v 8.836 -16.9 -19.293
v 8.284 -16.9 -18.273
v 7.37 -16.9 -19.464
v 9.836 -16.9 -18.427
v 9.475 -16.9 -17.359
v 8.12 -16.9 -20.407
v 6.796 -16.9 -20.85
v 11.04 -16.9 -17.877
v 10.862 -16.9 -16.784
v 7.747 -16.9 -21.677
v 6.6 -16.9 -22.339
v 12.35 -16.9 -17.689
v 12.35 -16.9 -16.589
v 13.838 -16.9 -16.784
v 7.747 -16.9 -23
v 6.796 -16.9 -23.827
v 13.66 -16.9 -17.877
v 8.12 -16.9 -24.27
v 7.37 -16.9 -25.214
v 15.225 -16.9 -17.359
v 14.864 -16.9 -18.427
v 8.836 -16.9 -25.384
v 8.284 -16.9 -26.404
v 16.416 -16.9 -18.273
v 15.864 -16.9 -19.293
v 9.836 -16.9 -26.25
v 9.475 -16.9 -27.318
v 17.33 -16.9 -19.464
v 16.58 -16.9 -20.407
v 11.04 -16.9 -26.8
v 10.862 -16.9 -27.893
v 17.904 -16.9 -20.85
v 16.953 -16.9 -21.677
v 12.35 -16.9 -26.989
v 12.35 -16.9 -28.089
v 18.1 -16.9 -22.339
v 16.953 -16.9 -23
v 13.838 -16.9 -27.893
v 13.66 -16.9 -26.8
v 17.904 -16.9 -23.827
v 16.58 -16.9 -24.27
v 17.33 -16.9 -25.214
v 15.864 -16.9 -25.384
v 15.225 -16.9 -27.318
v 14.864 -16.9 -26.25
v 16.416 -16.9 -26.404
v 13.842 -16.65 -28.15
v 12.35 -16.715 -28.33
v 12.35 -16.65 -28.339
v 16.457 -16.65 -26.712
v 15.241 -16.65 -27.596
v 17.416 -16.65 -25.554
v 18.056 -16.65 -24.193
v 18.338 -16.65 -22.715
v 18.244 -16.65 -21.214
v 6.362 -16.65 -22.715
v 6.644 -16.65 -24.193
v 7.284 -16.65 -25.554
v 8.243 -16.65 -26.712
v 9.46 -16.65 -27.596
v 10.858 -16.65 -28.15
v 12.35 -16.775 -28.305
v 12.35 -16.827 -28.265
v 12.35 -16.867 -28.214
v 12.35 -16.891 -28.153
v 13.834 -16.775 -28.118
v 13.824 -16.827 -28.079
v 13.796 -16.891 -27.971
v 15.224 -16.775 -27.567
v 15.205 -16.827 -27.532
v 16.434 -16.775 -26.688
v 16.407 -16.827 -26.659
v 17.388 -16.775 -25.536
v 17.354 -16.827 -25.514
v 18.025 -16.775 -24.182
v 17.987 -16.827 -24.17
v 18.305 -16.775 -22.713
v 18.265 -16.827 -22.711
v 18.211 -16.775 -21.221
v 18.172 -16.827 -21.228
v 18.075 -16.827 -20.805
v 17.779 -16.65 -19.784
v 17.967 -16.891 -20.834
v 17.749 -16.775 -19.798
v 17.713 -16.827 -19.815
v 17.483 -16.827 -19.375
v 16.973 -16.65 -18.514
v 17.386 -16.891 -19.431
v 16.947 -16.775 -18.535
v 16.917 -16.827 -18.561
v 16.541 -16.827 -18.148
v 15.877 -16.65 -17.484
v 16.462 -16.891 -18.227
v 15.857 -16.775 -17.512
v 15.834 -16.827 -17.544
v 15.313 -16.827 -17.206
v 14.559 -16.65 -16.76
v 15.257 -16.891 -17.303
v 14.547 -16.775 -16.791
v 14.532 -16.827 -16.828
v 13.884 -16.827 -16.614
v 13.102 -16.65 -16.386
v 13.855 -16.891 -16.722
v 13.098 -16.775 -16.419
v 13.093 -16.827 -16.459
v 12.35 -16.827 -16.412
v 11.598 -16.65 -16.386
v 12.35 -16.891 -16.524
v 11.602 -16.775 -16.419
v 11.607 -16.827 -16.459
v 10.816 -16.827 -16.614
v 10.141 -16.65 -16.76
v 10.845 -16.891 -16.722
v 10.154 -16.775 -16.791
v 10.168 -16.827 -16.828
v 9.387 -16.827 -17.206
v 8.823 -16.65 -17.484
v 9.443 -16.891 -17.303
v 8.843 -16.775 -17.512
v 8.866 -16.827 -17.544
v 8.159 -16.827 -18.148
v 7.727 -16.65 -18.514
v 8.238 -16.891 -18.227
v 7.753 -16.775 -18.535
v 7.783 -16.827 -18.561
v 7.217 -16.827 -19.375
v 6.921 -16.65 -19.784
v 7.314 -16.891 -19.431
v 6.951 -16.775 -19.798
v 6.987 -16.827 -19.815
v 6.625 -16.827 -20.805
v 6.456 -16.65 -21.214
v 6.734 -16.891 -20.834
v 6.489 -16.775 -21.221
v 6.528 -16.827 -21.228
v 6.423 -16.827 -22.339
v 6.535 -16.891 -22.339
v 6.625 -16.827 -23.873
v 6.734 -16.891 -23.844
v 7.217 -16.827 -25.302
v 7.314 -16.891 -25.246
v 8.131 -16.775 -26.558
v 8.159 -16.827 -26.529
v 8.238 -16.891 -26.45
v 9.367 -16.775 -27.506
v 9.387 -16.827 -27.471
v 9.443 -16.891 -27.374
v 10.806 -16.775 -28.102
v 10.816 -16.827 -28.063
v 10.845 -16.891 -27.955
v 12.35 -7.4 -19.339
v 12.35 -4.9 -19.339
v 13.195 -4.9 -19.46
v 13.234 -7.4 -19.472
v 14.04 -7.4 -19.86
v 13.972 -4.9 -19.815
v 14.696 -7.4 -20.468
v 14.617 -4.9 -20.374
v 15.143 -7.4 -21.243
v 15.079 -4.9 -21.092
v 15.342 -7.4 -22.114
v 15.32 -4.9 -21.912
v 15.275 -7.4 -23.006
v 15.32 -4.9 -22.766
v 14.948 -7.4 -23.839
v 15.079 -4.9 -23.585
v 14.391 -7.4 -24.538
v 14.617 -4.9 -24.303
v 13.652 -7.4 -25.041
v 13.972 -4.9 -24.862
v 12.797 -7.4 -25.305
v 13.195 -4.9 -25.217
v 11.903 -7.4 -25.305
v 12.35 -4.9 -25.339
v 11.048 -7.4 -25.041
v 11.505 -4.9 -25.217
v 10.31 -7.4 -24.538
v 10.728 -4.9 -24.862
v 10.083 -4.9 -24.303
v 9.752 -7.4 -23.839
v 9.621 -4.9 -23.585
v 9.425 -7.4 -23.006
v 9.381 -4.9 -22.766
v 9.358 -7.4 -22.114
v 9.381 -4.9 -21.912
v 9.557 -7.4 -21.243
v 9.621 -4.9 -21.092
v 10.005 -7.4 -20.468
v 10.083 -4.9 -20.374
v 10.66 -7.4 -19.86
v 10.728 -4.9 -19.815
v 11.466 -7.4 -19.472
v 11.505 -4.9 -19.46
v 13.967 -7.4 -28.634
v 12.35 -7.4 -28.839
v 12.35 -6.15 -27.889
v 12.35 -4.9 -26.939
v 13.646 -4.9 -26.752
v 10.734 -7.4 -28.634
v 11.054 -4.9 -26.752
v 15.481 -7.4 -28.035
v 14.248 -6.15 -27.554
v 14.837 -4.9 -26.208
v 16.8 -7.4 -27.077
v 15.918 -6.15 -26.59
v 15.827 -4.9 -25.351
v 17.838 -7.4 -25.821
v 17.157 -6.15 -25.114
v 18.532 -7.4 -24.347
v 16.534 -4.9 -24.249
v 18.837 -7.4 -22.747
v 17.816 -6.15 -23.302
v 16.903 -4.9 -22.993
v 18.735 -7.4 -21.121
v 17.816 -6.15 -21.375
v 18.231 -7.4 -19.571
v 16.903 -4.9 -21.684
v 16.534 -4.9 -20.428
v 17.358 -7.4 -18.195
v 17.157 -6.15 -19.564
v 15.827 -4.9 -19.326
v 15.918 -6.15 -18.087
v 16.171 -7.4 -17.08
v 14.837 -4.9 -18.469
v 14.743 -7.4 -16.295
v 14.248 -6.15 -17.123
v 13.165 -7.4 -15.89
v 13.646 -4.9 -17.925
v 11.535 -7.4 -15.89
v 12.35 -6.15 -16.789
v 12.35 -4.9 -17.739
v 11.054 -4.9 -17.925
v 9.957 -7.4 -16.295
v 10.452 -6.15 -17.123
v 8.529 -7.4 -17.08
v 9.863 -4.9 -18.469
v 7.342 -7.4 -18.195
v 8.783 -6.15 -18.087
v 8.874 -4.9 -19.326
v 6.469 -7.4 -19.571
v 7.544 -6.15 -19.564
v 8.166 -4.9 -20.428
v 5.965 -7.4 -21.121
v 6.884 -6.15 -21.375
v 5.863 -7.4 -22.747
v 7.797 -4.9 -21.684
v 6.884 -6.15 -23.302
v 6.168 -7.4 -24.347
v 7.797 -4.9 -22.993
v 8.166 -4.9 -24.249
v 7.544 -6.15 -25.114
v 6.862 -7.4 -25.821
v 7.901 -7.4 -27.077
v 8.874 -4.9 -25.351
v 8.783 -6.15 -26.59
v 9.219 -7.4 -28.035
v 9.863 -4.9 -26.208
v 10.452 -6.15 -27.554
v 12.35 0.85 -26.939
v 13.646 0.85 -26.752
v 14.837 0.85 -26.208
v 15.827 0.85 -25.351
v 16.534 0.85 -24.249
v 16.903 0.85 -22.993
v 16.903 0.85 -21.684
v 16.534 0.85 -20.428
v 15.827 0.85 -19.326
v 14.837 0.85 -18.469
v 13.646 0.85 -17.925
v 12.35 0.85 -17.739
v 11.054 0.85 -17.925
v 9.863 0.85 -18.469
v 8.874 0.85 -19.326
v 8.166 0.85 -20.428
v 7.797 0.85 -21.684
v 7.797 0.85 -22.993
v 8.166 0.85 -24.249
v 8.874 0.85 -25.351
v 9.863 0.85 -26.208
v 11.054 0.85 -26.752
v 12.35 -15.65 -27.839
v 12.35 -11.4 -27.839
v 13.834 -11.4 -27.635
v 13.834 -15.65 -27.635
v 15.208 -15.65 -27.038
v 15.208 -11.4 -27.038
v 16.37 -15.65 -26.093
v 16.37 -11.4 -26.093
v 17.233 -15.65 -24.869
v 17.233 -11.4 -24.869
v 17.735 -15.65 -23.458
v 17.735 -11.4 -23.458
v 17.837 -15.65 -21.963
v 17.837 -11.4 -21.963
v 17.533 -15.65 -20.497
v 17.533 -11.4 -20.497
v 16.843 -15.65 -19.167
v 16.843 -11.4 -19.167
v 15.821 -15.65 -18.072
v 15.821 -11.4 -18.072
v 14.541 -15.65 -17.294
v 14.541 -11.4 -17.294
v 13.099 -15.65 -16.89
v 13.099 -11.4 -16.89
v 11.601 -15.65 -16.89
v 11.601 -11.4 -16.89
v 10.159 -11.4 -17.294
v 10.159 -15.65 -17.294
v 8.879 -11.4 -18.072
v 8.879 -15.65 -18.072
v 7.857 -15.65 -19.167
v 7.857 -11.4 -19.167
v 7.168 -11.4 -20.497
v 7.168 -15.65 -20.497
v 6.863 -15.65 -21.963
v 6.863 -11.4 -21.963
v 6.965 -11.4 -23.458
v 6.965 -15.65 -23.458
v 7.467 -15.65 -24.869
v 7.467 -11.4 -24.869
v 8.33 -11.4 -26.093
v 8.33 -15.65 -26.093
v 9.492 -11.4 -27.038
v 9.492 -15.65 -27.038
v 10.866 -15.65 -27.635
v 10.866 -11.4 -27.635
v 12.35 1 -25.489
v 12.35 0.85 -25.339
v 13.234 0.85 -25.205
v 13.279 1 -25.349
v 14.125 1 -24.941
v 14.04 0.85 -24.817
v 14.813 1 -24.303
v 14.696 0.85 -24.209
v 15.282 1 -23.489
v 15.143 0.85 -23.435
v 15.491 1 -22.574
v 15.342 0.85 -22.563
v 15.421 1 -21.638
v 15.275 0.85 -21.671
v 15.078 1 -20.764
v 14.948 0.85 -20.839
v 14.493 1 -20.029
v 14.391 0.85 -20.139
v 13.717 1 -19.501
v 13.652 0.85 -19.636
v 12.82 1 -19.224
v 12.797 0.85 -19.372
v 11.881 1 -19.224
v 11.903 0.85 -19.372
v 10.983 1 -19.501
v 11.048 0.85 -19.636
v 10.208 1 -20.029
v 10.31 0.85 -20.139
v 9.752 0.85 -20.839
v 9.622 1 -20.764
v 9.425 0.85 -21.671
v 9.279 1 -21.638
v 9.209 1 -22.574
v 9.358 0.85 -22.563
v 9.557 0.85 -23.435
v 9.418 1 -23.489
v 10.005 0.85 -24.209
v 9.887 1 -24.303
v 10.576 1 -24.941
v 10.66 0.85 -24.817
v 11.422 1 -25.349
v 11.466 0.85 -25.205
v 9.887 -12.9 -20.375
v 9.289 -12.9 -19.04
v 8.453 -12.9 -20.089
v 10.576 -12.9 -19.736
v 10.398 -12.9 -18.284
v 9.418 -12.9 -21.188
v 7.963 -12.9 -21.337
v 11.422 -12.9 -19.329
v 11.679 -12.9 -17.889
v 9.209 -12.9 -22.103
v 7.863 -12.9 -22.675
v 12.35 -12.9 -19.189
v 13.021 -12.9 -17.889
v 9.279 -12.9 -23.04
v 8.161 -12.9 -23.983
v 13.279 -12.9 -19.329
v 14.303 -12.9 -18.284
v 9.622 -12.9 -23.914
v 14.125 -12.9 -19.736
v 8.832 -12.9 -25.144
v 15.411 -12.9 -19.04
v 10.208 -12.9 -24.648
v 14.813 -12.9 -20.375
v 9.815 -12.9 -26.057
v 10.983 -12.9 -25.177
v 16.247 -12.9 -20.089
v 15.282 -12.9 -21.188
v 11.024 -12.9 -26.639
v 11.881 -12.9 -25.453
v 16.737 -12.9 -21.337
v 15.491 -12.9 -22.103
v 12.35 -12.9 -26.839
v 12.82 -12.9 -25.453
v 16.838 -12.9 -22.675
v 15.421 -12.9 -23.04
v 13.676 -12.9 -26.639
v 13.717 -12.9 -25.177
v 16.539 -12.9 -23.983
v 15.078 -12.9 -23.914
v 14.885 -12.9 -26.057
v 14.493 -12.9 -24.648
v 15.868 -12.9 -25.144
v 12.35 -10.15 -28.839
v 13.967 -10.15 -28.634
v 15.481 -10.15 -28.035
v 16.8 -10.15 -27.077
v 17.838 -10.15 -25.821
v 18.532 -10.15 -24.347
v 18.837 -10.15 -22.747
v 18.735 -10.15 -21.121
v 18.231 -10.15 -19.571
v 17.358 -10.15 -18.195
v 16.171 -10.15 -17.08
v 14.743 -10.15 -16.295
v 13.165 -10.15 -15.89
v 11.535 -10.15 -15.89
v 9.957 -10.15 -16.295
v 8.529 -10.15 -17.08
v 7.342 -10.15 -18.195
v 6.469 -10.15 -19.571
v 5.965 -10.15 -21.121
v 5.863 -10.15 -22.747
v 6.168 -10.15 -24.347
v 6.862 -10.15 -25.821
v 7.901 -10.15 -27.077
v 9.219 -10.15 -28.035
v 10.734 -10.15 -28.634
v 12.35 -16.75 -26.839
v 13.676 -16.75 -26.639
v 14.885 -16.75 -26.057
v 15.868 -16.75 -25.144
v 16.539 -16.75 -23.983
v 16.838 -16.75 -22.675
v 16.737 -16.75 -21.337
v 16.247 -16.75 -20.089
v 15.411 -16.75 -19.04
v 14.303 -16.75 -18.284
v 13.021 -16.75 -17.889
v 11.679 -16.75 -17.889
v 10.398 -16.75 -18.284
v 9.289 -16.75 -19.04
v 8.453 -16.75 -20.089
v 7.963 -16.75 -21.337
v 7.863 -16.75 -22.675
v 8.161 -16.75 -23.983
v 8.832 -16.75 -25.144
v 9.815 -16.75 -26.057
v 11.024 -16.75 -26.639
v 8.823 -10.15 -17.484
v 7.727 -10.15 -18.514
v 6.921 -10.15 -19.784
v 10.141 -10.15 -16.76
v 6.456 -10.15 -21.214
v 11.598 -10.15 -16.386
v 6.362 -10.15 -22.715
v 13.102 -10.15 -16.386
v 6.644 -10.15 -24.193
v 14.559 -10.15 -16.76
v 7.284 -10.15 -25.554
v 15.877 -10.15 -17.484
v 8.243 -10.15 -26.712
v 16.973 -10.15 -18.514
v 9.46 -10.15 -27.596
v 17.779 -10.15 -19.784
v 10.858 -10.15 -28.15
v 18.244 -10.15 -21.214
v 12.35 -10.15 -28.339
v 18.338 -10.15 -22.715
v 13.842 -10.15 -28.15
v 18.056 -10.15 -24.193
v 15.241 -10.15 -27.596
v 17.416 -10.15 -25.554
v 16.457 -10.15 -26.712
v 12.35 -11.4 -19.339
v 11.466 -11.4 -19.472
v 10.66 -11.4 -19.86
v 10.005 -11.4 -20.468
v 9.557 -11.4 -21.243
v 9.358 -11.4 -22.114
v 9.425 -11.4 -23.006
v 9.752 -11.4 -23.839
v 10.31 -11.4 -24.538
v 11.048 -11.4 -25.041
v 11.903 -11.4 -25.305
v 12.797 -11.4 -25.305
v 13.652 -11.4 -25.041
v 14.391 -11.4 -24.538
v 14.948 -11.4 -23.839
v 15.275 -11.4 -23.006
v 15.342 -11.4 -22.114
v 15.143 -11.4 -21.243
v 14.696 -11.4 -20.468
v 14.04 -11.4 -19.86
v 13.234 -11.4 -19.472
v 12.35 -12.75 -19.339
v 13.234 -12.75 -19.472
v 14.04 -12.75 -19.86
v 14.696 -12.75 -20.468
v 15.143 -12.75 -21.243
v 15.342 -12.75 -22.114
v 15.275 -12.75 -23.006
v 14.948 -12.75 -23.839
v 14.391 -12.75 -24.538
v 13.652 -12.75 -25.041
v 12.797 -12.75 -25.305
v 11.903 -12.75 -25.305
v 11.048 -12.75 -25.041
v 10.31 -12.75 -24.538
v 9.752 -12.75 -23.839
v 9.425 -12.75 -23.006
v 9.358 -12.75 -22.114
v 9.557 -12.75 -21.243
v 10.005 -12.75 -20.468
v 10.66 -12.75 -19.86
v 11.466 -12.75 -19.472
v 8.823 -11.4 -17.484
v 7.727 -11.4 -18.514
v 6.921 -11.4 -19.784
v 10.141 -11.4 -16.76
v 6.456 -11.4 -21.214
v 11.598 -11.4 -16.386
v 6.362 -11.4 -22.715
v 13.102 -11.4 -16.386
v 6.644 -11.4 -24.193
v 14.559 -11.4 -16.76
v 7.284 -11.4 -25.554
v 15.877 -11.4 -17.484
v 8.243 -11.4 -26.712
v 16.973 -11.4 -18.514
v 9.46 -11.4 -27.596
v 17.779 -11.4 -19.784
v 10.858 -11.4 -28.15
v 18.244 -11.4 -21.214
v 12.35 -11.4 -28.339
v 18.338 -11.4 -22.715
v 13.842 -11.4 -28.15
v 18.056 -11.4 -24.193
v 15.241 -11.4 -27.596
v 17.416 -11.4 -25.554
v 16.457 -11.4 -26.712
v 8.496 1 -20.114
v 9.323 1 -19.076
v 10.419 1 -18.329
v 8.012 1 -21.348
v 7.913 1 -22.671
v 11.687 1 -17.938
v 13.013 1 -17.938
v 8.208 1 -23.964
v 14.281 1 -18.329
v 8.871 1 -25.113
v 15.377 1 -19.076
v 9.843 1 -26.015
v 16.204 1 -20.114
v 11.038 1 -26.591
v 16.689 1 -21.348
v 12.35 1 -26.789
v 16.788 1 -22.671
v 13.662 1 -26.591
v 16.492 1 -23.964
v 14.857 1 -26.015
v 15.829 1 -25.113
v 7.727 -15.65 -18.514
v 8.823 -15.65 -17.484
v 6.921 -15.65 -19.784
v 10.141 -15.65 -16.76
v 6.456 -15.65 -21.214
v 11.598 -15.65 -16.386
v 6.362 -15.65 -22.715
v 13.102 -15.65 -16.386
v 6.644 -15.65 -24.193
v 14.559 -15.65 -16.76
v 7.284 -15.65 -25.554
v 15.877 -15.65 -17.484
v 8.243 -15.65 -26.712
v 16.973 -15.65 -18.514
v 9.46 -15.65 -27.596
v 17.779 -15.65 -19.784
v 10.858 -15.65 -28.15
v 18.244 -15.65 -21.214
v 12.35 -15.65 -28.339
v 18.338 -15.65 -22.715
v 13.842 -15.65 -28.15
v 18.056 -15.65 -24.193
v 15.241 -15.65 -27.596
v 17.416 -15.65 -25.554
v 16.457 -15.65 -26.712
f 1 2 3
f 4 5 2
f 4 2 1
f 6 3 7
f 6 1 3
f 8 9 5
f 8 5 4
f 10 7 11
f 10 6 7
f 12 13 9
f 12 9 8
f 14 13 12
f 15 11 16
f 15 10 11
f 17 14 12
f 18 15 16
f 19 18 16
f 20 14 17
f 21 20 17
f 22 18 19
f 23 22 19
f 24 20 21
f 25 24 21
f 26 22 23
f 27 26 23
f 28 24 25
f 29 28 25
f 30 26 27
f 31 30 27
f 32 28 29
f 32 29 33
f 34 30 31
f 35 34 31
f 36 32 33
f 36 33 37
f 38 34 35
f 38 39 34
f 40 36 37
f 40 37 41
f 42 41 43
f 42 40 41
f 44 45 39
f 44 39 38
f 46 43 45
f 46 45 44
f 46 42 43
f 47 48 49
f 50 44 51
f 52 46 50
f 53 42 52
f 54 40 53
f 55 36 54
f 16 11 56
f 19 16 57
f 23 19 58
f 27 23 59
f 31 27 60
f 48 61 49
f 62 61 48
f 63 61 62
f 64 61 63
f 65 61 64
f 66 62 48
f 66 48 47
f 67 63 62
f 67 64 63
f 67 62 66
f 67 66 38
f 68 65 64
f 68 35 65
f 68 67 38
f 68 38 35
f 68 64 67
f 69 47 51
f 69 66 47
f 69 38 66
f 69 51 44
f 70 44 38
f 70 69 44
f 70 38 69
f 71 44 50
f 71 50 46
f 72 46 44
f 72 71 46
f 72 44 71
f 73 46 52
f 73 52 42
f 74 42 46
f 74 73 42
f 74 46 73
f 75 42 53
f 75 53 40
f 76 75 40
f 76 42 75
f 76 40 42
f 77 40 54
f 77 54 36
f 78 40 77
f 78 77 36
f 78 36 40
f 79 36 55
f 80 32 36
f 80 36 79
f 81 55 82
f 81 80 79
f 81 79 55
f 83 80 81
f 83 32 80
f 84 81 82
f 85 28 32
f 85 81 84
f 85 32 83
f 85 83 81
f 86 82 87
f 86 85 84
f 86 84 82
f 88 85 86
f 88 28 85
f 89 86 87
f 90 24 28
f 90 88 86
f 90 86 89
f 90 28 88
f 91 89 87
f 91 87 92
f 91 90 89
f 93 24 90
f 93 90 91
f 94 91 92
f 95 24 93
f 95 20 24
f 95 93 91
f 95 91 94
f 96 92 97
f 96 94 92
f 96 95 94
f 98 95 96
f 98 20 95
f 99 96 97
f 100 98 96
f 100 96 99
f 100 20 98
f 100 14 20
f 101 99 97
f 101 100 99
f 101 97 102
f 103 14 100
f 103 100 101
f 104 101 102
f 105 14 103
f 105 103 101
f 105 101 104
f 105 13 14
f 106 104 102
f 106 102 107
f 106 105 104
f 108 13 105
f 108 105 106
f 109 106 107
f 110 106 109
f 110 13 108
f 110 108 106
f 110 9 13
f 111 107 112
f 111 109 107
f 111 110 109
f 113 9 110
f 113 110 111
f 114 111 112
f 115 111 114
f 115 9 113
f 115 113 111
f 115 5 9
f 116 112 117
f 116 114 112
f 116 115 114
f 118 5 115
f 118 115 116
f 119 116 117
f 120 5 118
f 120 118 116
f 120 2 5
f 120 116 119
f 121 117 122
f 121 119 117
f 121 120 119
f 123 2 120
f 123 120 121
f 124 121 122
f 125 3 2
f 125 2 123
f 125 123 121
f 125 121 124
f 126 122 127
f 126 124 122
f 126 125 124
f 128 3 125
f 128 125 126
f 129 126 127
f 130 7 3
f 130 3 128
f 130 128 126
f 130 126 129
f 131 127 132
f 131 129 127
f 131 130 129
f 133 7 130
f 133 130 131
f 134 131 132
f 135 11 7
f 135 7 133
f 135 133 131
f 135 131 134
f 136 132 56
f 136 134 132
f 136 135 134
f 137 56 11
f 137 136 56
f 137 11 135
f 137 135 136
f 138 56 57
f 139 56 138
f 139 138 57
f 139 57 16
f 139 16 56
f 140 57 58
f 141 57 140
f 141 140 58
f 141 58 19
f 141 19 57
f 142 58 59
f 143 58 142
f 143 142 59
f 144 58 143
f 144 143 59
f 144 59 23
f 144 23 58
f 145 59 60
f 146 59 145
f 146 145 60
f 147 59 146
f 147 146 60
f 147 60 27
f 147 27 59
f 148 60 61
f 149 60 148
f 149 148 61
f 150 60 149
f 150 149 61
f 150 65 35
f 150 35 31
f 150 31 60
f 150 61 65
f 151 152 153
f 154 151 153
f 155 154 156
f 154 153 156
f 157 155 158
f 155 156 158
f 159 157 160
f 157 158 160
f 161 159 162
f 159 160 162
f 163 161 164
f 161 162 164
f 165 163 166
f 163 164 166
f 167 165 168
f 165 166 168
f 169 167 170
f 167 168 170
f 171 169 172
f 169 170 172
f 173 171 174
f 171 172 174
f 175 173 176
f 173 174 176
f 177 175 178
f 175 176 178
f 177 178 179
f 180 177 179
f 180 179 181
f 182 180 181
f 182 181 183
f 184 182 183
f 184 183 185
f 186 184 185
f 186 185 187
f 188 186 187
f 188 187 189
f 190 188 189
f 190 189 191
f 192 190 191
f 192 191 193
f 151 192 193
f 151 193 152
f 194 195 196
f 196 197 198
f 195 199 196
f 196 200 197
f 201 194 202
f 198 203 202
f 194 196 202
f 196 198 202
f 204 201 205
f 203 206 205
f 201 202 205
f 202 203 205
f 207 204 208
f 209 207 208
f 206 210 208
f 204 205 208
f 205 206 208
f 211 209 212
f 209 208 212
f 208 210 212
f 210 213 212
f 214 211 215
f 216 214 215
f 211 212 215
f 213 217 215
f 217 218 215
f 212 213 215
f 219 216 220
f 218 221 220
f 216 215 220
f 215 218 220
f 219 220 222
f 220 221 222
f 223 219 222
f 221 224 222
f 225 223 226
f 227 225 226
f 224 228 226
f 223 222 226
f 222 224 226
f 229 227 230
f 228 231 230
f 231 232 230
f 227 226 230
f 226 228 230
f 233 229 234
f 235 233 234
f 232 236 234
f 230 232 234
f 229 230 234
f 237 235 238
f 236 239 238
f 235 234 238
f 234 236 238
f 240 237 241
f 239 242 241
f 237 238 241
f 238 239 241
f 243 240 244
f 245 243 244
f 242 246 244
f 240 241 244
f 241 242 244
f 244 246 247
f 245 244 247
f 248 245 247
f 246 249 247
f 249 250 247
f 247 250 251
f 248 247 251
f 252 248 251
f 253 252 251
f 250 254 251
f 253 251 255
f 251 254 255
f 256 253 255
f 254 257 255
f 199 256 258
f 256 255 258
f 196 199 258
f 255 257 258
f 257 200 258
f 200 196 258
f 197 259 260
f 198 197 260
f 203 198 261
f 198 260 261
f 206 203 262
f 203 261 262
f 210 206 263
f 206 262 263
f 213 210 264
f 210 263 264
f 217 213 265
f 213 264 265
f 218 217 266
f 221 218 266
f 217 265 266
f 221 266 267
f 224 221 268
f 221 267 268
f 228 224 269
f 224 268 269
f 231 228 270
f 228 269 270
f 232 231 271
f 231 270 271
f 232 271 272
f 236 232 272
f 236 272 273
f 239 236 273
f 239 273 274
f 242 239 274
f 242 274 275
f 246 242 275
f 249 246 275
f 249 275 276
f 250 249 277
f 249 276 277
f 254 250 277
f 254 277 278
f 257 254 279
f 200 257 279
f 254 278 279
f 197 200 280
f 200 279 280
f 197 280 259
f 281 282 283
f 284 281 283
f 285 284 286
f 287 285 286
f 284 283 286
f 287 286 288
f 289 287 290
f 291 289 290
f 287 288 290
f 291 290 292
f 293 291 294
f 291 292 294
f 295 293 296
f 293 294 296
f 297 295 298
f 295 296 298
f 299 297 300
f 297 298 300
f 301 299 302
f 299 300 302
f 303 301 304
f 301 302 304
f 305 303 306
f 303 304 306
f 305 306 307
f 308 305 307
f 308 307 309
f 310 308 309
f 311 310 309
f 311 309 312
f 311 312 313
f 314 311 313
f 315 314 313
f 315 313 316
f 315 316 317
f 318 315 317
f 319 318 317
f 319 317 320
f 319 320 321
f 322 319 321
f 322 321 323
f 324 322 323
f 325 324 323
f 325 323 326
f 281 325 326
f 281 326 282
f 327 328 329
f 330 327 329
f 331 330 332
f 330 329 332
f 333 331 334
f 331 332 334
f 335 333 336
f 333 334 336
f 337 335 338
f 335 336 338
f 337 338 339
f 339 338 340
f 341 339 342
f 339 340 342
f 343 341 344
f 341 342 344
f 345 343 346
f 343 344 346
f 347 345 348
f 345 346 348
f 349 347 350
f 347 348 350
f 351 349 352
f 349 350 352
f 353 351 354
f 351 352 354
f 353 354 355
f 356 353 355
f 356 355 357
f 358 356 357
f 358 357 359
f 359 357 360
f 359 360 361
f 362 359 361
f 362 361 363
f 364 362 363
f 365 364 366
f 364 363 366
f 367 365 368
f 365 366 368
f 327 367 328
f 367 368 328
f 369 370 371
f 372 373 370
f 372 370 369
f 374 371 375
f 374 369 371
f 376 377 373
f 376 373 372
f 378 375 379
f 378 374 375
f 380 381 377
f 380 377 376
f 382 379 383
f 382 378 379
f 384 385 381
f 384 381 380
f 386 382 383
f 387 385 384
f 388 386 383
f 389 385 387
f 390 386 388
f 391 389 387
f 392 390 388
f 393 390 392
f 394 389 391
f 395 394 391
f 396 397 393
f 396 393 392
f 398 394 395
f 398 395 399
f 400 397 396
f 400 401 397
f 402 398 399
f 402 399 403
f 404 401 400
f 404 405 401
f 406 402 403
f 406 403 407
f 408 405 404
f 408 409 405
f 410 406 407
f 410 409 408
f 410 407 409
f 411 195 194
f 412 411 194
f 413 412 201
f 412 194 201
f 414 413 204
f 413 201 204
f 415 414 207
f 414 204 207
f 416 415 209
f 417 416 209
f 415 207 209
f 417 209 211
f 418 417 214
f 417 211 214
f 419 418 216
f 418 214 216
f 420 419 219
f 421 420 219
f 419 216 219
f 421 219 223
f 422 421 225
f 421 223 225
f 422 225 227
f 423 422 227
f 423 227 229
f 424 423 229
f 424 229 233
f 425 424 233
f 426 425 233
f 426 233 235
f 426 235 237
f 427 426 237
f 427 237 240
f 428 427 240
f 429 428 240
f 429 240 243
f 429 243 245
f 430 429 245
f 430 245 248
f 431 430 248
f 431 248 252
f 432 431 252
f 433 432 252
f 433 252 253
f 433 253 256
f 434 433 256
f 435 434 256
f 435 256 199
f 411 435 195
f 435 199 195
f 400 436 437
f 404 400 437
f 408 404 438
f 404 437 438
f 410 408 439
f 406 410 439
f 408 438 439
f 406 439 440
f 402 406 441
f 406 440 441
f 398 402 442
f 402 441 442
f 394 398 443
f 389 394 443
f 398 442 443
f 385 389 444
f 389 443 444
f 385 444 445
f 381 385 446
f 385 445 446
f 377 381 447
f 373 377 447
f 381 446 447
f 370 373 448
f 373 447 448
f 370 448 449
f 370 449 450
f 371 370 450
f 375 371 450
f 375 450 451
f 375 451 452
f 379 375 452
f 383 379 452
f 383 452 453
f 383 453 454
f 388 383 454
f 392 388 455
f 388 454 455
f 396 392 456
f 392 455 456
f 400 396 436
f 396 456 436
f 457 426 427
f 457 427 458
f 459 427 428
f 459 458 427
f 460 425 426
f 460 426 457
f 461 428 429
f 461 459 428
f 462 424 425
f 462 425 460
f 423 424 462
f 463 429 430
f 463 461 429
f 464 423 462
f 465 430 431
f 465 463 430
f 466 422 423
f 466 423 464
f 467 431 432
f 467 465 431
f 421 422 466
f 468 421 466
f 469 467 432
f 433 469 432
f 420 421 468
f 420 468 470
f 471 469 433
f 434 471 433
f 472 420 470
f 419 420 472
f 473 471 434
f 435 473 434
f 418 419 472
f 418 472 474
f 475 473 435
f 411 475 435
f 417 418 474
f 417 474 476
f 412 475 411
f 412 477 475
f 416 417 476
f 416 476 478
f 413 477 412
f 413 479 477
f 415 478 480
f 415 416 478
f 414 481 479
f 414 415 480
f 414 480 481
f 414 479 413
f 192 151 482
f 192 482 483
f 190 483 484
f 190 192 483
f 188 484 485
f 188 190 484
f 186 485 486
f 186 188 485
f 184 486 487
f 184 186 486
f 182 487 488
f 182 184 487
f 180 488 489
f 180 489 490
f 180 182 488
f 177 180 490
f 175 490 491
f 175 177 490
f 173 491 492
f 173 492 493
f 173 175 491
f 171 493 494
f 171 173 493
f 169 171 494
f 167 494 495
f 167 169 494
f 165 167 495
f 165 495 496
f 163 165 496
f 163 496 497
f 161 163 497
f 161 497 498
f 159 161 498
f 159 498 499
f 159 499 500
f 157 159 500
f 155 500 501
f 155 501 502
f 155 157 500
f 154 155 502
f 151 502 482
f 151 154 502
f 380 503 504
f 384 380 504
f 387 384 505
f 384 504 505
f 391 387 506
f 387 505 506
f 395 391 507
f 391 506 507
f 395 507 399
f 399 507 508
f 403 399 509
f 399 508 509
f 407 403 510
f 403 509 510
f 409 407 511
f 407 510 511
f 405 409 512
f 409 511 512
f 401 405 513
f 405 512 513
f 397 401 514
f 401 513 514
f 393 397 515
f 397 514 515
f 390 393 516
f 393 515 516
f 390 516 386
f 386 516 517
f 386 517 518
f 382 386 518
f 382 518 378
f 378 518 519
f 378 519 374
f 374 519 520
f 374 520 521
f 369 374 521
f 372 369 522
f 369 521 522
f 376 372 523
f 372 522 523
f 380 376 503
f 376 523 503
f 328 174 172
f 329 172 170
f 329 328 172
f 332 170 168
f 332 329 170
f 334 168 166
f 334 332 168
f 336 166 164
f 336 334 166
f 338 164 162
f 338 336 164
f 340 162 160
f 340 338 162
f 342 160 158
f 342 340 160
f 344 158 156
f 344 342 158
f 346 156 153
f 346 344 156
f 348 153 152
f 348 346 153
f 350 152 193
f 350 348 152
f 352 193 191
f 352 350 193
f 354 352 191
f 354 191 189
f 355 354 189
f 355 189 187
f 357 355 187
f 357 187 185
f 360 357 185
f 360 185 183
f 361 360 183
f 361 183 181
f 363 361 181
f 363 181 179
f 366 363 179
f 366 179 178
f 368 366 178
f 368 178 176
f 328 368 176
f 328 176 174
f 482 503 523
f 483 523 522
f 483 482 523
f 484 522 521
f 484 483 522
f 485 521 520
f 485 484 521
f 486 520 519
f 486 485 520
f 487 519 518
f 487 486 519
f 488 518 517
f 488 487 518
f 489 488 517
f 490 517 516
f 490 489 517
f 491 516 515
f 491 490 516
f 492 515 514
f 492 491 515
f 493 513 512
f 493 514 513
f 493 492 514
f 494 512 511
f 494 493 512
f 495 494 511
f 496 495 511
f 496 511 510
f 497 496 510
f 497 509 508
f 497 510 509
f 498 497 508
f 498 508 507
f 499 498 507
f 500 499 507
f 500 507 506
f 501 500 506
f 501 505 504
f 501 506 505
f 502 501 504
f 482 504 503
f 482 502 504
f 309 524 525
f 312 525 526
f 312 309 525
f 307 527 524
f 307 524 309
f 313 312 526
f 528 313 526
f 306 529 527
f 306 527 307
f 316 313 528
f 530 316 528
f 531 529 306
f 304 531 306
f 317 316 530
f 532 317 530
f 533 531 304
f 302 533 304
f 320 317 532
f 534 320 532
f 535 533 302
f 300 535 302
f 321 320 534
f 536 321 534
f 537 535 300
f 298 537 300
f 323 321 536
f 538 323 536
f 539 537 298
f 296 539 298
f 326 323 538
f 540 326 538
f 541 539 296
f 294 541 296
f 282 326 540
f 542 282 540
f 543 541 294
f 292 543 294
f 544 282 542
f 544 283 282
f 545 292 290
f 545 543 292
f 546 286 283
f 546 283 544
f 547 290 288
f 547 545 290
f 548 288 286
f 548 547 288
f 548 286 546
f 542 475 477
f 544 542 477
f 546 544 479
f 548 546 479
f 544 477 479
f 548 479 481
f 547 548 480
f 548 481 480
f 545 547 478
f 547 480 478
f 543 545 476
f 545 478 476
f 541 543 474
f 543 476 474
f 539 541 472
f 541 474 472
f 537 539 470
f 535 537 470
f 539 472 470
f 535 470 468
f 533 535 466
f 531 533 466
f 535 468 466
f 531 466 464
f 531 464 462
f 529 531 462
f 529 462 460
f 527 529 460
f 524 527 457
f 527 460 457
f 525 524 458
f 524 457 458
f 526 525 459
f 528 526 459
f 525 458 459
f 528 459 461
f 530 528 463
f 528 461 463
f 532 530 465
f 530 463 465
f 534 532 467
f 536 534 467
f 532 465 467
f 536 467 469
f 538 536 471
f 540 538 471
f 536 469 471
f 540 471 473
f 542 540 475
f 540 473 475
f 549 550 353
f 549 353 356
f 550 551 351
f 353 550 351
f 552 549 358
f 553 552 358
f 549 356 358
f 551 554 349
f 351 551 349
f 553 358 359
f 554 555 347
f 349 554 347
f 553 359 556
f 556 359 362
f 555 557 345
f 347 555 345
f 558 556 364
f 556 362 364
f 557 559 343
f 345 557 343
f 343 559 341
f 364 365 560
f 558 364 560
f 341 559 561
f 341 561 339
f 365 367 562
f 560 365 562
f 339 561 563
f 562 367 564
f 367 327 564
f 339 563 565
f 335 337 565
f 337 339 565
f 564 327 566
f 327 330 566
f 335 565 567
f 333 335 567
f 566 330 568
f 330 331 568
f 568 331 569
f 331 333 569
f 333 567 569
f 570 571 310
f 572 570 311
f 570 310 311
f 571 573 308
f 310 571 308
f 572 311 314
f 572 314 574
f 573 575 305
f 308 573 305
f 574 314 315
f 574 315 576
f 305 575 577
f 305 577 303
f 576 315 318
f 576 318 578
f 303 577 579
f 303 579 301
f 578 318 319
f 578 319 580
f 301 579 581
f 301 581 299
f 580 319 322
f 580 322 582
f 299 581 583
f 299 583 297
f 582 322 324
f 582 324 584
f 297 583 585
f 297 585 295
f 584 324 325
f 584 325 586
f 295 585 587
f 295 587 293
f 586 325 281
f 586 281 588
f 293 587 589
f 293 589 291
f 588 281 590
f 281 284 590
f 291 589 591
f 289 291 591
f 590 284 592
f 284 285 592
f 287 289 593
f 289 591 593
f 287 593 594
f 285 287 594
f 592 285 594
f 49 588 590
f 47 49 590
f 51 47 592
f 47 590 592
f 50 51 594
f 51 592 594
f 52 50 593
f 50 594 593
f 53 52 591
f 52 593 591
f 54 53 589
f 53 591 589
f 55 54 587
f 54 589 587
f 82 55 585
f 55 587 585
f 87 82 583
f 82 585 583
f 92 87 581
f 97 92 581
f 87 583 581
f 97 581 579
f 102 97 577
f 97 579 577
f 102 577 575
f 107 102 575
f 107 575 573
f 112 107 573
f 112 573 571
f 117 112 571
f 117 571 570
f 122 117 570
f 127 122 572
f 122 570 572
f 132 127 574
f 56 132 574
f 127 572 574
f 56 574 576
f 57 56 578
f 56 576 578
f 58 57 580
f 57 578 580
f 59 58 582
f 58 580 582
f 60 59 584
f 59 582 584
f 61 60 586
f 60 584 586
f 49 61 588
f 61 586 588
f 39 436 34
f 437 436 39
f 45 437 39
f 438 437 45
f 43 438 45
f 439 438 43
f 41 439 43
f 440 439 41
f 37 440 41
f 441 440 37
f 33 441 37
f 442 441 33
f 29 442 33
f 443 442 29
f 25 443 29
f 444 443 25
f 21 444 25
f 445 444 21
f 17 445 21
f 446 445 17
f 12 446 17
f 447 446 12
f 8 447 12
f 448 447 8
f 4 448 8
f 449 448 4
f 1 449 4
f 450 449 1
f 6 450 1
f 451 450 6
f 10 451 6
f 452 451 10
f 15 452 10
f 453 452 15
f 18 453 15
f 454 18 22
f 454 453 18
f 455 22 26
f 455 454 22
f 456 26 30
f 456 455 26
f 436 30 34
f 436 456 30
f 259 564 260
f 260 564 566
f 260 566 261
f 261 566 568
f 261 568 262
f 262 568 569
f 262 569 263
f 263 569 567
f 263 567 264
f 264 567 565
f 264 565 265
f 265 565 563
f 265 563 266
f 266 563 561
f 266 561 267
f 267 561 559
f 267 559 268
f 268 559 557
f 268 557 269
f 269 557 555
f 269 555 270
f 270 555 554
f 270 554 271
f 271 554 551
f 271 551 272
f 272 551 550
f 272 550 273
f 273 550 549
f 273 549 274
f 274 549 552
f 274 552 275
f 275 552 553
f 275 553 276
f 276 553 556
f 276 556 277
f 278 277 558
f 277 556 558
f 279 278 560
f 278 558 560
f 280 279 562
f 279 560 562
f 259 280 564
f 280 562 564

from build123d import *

# Parameters (mm, degrees)
SKETCH1_R           = 4.6
SKETCH1_R_2         = 3
BOSS_EXTRUDE1_DEPTH = 5.9
CHAMFER1_SIZE       = 0.15
CHAMFER2_SIZE       = 0.15
SKETCH2_R           = 4.6
BOSS_EXTRUDE2_DEPTH = 2.5
BOSS_EXTRUDE2_DRAFT = -37.234833982
SKETCH3_R           = 3
CUT_EXTRUDE1_DEPTH  = 2.5
SKETCH4_R           = 6.5
SKETCH4_R_2         = 3
BOSS_EXTRUDE3_DEPTH = 4
SKETCH5_R           = 5.5
SKETCH5_R_2         = 3
BOSS_EXTRUDE4_DEPTH = 5.5
CUT_EXTRUDE2_START  = -1.25
SKETCH6_R           = 6.5
SKETCH6_R_2         = 6
CUT_EXTRUDE2_DEPTH  = 1.25
BOSS_EXTRUDE5_START = -1.25
SKETCH7_R           = 6
SKETCH7_R_2         = 5.5
BOSS_EXTRUDE5_DEPTH = 1.25
FILLET1_R           = 0.25
SKETCH8_R           = 4.5
CUT_EXTRUDE3_DEPTH  = 4
CHAMFER4_SIZE       = 0.15
CHAMFER5_SIZE       = 0.15


with BuildPart() as part:
    # Sketch1 → Boss-Extrude1 (new body)
    with BuildSketch(Plane(origin=(0, 1, 0), x_dir=(-1, 0, 0), z_dir=(0, -1, 0))):
        with Locations(Location((-12.350088109, 22.338562584, 0), (0, 0, 90))):
            Circle(SKETCH1_R)
        with Locations(Location((-12.350088109, 22.338562584, 0), (0, 0, 90))):
            Circle(SKETCH1_R_2, mode=Mode.SUBTRACT)
    extrude(amount=BOSS_EXTRUDE1_DEPTH)

    # Chamfer1
    chamfer1_edges = [part.edges().sort_by_distance(p)[0] for p in [
        (12.350088109, 1, -17.738562584),
    ]]
    chamfer(chamfer1_edges, length=CHAMFER1_SIZE)

    # Chamfer2
    chamfer2_edges = [part.edges().sort_by_distance(p)[0] for p in [
        (12.350088109, 1, -19.338562584),
    ]]
    chamfer(chamfer2_edges, length=CHAMFER2_SIZE)


with BuildPart() as boss_extrude2_tool:
    # Sketch2 → Boss-Extrude2 (with draft: the straight prism first)
    with BuildSketch(Plane(origin=(0, -4.9, 0), x_dir=(-1, 0, 0), z_dir=(0, -1, 0))):
        with Locations(Location((-12.350088109, 22.338562584, 0), (0, 0, 90))):
            Circle(SKETCH2_R)
    extrude(amount=BOSS_EXTRUDE2_DEPTH)
    # Boss-Extrude2: the draft: its side faces are tilted about the plane it starts from
    boss_extrude2_sides = [boss_extrude2_tool.faces().sort_by_distance(p)[0] for p in [
        (12.350088109, -6.15, -17.738562584),
    ]]
    draft(boss_extrude2_sides, Plane(origin=(0, -4.9, 0), x_dir=(-1, 0, 0), z_dir=(0, -1, 0)), BOSS_EXTRUDE2_DRAFT)


with BuildPart() as part_1:
    add(part.part)

    # Boss-Extrude2: add boss_extrude2_tool
    add(boss_extrude2_tool.part)

    # Sketch3 → Cut-Extrude1 (cut)
    with BuildSketch(Plane(origin=(0, -4.9, 0), x_dir=(1, 0, 0), z_dir=(0, 1, 0))):
        with Locations(Location((12.350088109, 22.338562584, 0), (0, 0, 270))):
            Circle(SKETCH3_R)
    extrude(amount=-CUT_EXTRUDE1_DEPTH, mode=Mode.SUBTRACT)

    # Sketch4 → Boss-Extrude3 (add)
    with BuildSketch(Plane(origin=(0, -7.4, 0), x_dir=(-1, 0, 0), z_dir=(0, -1, 0))):
        with Locations(Location((-12.350088109, 22.338562584, 0), (0, 0, 90))):
            Circle(SKETCH4_R)
        with Locations(Location((-12.350088109, 22.338562584, 0), (0, 0, 270))):
            Circle(SKETCH4_R_2, mode=Mode.SUBTRACT)
    extrude(amount=BOSS_EXTRUDE3_DEPTH)

    # Sketch5 → Boss-Extrude4 (add)
    with BuildSketch(Plane.XZ.offset(11.4)):
        with Locations(Location((12.350088109, -22.338562584, 0), (0, 0, 270))):
            Circle(SKETCH5_R)
        with Locations(Location((12.350088109, -22.338562584, 0), (0, 0, 90))):
            Circle(SKETCH5_R_2, mode=Mode.SUBTRACT)
    extrude(amount=BOSS_EXTRUDE4_DEPTH)

    # Sketch6 → Cut-Extrude2 (cut)
    with BuildSketch(Plane.XZ.offset(11.4).offset(CUT_EXTRUDE2_START)):
        with Locations(Location((12.350088109, -22.338562584, 0), (0, 0, 270))):
            Circle(SKETCH6_R)
        with Locations(Location((12.350088109, -22.338562584, 0), (0, 0, 270))):
            Circle(SKETCH6_R_2, mode=Mode.SUBTRACT)
    extrude(amount=CUT_EXTRUDE2_DEPTH, mode=Mode.SUBTRACT)

    # Sketch7 → Boss-Extrude5 (add)
    with BuildSketch(Plane(origin=(0, -16.9, 0), x_dir=(-1, 0, 0), z_dir=(0, -1, 0)).offset(BOSS_EXTRUDE5_START)):
        with Locations(Location((-12.350088109, 22.338562584, 0), (0, 0, 90))):
            Circle(SKETCH7_R)
        with Locations(Location((-12.350088109, 22.338562584, 0), (0, 0, 90))):
            Circle(SKETCH7_R_2, mode=Mode.SUBTRACT)
    extrude(amount=BOSS_EXTRUDE5_DEPTH)

    # Fillet1
    fillet1_edges = [part_1.edges().sort_by_distance(p)[0] for p in [
        (12.350088109, -16.9, -16.338562584),
    ]]
    fillet(fillet1_edges, radius=FILLET1_R)

    # Sketch8 → Cut-Extrude3 (cut)
    with BuildSketch(Plane(origin=(0, -16.9, 0), x_dir=(-1, 0, 0), z_dir=(0, -1, 0))):
        with Locations(Location((-12.350088109, 22.338562584, 0), (0, 0, 90))):
            Circle(SKETCH8_R)
    extrude(amount=-CUT_EXTRUDE3_DEPTH, mode=Mode.SUBTRACT)

    # Chamfer4
    chamfer4_edges = [part_1.edges().sort_by_distance(p)[0] for p in [
        (12.350088109, -16.9, -17.838562584),
    ]]
    chamfer(chamfer4_edges, length=CHAMFER4_SIZE)

    # Chamfer5
    chamfer5_edges = [part_1.edges().sort_by_distance(p)[0] for p in [
        (12.350088109, -12.9, -25.338562584),
    ]]
    chamfer(chamfer5_edges, length=CHAMFER5_SIZE)


solid = part_1.part
